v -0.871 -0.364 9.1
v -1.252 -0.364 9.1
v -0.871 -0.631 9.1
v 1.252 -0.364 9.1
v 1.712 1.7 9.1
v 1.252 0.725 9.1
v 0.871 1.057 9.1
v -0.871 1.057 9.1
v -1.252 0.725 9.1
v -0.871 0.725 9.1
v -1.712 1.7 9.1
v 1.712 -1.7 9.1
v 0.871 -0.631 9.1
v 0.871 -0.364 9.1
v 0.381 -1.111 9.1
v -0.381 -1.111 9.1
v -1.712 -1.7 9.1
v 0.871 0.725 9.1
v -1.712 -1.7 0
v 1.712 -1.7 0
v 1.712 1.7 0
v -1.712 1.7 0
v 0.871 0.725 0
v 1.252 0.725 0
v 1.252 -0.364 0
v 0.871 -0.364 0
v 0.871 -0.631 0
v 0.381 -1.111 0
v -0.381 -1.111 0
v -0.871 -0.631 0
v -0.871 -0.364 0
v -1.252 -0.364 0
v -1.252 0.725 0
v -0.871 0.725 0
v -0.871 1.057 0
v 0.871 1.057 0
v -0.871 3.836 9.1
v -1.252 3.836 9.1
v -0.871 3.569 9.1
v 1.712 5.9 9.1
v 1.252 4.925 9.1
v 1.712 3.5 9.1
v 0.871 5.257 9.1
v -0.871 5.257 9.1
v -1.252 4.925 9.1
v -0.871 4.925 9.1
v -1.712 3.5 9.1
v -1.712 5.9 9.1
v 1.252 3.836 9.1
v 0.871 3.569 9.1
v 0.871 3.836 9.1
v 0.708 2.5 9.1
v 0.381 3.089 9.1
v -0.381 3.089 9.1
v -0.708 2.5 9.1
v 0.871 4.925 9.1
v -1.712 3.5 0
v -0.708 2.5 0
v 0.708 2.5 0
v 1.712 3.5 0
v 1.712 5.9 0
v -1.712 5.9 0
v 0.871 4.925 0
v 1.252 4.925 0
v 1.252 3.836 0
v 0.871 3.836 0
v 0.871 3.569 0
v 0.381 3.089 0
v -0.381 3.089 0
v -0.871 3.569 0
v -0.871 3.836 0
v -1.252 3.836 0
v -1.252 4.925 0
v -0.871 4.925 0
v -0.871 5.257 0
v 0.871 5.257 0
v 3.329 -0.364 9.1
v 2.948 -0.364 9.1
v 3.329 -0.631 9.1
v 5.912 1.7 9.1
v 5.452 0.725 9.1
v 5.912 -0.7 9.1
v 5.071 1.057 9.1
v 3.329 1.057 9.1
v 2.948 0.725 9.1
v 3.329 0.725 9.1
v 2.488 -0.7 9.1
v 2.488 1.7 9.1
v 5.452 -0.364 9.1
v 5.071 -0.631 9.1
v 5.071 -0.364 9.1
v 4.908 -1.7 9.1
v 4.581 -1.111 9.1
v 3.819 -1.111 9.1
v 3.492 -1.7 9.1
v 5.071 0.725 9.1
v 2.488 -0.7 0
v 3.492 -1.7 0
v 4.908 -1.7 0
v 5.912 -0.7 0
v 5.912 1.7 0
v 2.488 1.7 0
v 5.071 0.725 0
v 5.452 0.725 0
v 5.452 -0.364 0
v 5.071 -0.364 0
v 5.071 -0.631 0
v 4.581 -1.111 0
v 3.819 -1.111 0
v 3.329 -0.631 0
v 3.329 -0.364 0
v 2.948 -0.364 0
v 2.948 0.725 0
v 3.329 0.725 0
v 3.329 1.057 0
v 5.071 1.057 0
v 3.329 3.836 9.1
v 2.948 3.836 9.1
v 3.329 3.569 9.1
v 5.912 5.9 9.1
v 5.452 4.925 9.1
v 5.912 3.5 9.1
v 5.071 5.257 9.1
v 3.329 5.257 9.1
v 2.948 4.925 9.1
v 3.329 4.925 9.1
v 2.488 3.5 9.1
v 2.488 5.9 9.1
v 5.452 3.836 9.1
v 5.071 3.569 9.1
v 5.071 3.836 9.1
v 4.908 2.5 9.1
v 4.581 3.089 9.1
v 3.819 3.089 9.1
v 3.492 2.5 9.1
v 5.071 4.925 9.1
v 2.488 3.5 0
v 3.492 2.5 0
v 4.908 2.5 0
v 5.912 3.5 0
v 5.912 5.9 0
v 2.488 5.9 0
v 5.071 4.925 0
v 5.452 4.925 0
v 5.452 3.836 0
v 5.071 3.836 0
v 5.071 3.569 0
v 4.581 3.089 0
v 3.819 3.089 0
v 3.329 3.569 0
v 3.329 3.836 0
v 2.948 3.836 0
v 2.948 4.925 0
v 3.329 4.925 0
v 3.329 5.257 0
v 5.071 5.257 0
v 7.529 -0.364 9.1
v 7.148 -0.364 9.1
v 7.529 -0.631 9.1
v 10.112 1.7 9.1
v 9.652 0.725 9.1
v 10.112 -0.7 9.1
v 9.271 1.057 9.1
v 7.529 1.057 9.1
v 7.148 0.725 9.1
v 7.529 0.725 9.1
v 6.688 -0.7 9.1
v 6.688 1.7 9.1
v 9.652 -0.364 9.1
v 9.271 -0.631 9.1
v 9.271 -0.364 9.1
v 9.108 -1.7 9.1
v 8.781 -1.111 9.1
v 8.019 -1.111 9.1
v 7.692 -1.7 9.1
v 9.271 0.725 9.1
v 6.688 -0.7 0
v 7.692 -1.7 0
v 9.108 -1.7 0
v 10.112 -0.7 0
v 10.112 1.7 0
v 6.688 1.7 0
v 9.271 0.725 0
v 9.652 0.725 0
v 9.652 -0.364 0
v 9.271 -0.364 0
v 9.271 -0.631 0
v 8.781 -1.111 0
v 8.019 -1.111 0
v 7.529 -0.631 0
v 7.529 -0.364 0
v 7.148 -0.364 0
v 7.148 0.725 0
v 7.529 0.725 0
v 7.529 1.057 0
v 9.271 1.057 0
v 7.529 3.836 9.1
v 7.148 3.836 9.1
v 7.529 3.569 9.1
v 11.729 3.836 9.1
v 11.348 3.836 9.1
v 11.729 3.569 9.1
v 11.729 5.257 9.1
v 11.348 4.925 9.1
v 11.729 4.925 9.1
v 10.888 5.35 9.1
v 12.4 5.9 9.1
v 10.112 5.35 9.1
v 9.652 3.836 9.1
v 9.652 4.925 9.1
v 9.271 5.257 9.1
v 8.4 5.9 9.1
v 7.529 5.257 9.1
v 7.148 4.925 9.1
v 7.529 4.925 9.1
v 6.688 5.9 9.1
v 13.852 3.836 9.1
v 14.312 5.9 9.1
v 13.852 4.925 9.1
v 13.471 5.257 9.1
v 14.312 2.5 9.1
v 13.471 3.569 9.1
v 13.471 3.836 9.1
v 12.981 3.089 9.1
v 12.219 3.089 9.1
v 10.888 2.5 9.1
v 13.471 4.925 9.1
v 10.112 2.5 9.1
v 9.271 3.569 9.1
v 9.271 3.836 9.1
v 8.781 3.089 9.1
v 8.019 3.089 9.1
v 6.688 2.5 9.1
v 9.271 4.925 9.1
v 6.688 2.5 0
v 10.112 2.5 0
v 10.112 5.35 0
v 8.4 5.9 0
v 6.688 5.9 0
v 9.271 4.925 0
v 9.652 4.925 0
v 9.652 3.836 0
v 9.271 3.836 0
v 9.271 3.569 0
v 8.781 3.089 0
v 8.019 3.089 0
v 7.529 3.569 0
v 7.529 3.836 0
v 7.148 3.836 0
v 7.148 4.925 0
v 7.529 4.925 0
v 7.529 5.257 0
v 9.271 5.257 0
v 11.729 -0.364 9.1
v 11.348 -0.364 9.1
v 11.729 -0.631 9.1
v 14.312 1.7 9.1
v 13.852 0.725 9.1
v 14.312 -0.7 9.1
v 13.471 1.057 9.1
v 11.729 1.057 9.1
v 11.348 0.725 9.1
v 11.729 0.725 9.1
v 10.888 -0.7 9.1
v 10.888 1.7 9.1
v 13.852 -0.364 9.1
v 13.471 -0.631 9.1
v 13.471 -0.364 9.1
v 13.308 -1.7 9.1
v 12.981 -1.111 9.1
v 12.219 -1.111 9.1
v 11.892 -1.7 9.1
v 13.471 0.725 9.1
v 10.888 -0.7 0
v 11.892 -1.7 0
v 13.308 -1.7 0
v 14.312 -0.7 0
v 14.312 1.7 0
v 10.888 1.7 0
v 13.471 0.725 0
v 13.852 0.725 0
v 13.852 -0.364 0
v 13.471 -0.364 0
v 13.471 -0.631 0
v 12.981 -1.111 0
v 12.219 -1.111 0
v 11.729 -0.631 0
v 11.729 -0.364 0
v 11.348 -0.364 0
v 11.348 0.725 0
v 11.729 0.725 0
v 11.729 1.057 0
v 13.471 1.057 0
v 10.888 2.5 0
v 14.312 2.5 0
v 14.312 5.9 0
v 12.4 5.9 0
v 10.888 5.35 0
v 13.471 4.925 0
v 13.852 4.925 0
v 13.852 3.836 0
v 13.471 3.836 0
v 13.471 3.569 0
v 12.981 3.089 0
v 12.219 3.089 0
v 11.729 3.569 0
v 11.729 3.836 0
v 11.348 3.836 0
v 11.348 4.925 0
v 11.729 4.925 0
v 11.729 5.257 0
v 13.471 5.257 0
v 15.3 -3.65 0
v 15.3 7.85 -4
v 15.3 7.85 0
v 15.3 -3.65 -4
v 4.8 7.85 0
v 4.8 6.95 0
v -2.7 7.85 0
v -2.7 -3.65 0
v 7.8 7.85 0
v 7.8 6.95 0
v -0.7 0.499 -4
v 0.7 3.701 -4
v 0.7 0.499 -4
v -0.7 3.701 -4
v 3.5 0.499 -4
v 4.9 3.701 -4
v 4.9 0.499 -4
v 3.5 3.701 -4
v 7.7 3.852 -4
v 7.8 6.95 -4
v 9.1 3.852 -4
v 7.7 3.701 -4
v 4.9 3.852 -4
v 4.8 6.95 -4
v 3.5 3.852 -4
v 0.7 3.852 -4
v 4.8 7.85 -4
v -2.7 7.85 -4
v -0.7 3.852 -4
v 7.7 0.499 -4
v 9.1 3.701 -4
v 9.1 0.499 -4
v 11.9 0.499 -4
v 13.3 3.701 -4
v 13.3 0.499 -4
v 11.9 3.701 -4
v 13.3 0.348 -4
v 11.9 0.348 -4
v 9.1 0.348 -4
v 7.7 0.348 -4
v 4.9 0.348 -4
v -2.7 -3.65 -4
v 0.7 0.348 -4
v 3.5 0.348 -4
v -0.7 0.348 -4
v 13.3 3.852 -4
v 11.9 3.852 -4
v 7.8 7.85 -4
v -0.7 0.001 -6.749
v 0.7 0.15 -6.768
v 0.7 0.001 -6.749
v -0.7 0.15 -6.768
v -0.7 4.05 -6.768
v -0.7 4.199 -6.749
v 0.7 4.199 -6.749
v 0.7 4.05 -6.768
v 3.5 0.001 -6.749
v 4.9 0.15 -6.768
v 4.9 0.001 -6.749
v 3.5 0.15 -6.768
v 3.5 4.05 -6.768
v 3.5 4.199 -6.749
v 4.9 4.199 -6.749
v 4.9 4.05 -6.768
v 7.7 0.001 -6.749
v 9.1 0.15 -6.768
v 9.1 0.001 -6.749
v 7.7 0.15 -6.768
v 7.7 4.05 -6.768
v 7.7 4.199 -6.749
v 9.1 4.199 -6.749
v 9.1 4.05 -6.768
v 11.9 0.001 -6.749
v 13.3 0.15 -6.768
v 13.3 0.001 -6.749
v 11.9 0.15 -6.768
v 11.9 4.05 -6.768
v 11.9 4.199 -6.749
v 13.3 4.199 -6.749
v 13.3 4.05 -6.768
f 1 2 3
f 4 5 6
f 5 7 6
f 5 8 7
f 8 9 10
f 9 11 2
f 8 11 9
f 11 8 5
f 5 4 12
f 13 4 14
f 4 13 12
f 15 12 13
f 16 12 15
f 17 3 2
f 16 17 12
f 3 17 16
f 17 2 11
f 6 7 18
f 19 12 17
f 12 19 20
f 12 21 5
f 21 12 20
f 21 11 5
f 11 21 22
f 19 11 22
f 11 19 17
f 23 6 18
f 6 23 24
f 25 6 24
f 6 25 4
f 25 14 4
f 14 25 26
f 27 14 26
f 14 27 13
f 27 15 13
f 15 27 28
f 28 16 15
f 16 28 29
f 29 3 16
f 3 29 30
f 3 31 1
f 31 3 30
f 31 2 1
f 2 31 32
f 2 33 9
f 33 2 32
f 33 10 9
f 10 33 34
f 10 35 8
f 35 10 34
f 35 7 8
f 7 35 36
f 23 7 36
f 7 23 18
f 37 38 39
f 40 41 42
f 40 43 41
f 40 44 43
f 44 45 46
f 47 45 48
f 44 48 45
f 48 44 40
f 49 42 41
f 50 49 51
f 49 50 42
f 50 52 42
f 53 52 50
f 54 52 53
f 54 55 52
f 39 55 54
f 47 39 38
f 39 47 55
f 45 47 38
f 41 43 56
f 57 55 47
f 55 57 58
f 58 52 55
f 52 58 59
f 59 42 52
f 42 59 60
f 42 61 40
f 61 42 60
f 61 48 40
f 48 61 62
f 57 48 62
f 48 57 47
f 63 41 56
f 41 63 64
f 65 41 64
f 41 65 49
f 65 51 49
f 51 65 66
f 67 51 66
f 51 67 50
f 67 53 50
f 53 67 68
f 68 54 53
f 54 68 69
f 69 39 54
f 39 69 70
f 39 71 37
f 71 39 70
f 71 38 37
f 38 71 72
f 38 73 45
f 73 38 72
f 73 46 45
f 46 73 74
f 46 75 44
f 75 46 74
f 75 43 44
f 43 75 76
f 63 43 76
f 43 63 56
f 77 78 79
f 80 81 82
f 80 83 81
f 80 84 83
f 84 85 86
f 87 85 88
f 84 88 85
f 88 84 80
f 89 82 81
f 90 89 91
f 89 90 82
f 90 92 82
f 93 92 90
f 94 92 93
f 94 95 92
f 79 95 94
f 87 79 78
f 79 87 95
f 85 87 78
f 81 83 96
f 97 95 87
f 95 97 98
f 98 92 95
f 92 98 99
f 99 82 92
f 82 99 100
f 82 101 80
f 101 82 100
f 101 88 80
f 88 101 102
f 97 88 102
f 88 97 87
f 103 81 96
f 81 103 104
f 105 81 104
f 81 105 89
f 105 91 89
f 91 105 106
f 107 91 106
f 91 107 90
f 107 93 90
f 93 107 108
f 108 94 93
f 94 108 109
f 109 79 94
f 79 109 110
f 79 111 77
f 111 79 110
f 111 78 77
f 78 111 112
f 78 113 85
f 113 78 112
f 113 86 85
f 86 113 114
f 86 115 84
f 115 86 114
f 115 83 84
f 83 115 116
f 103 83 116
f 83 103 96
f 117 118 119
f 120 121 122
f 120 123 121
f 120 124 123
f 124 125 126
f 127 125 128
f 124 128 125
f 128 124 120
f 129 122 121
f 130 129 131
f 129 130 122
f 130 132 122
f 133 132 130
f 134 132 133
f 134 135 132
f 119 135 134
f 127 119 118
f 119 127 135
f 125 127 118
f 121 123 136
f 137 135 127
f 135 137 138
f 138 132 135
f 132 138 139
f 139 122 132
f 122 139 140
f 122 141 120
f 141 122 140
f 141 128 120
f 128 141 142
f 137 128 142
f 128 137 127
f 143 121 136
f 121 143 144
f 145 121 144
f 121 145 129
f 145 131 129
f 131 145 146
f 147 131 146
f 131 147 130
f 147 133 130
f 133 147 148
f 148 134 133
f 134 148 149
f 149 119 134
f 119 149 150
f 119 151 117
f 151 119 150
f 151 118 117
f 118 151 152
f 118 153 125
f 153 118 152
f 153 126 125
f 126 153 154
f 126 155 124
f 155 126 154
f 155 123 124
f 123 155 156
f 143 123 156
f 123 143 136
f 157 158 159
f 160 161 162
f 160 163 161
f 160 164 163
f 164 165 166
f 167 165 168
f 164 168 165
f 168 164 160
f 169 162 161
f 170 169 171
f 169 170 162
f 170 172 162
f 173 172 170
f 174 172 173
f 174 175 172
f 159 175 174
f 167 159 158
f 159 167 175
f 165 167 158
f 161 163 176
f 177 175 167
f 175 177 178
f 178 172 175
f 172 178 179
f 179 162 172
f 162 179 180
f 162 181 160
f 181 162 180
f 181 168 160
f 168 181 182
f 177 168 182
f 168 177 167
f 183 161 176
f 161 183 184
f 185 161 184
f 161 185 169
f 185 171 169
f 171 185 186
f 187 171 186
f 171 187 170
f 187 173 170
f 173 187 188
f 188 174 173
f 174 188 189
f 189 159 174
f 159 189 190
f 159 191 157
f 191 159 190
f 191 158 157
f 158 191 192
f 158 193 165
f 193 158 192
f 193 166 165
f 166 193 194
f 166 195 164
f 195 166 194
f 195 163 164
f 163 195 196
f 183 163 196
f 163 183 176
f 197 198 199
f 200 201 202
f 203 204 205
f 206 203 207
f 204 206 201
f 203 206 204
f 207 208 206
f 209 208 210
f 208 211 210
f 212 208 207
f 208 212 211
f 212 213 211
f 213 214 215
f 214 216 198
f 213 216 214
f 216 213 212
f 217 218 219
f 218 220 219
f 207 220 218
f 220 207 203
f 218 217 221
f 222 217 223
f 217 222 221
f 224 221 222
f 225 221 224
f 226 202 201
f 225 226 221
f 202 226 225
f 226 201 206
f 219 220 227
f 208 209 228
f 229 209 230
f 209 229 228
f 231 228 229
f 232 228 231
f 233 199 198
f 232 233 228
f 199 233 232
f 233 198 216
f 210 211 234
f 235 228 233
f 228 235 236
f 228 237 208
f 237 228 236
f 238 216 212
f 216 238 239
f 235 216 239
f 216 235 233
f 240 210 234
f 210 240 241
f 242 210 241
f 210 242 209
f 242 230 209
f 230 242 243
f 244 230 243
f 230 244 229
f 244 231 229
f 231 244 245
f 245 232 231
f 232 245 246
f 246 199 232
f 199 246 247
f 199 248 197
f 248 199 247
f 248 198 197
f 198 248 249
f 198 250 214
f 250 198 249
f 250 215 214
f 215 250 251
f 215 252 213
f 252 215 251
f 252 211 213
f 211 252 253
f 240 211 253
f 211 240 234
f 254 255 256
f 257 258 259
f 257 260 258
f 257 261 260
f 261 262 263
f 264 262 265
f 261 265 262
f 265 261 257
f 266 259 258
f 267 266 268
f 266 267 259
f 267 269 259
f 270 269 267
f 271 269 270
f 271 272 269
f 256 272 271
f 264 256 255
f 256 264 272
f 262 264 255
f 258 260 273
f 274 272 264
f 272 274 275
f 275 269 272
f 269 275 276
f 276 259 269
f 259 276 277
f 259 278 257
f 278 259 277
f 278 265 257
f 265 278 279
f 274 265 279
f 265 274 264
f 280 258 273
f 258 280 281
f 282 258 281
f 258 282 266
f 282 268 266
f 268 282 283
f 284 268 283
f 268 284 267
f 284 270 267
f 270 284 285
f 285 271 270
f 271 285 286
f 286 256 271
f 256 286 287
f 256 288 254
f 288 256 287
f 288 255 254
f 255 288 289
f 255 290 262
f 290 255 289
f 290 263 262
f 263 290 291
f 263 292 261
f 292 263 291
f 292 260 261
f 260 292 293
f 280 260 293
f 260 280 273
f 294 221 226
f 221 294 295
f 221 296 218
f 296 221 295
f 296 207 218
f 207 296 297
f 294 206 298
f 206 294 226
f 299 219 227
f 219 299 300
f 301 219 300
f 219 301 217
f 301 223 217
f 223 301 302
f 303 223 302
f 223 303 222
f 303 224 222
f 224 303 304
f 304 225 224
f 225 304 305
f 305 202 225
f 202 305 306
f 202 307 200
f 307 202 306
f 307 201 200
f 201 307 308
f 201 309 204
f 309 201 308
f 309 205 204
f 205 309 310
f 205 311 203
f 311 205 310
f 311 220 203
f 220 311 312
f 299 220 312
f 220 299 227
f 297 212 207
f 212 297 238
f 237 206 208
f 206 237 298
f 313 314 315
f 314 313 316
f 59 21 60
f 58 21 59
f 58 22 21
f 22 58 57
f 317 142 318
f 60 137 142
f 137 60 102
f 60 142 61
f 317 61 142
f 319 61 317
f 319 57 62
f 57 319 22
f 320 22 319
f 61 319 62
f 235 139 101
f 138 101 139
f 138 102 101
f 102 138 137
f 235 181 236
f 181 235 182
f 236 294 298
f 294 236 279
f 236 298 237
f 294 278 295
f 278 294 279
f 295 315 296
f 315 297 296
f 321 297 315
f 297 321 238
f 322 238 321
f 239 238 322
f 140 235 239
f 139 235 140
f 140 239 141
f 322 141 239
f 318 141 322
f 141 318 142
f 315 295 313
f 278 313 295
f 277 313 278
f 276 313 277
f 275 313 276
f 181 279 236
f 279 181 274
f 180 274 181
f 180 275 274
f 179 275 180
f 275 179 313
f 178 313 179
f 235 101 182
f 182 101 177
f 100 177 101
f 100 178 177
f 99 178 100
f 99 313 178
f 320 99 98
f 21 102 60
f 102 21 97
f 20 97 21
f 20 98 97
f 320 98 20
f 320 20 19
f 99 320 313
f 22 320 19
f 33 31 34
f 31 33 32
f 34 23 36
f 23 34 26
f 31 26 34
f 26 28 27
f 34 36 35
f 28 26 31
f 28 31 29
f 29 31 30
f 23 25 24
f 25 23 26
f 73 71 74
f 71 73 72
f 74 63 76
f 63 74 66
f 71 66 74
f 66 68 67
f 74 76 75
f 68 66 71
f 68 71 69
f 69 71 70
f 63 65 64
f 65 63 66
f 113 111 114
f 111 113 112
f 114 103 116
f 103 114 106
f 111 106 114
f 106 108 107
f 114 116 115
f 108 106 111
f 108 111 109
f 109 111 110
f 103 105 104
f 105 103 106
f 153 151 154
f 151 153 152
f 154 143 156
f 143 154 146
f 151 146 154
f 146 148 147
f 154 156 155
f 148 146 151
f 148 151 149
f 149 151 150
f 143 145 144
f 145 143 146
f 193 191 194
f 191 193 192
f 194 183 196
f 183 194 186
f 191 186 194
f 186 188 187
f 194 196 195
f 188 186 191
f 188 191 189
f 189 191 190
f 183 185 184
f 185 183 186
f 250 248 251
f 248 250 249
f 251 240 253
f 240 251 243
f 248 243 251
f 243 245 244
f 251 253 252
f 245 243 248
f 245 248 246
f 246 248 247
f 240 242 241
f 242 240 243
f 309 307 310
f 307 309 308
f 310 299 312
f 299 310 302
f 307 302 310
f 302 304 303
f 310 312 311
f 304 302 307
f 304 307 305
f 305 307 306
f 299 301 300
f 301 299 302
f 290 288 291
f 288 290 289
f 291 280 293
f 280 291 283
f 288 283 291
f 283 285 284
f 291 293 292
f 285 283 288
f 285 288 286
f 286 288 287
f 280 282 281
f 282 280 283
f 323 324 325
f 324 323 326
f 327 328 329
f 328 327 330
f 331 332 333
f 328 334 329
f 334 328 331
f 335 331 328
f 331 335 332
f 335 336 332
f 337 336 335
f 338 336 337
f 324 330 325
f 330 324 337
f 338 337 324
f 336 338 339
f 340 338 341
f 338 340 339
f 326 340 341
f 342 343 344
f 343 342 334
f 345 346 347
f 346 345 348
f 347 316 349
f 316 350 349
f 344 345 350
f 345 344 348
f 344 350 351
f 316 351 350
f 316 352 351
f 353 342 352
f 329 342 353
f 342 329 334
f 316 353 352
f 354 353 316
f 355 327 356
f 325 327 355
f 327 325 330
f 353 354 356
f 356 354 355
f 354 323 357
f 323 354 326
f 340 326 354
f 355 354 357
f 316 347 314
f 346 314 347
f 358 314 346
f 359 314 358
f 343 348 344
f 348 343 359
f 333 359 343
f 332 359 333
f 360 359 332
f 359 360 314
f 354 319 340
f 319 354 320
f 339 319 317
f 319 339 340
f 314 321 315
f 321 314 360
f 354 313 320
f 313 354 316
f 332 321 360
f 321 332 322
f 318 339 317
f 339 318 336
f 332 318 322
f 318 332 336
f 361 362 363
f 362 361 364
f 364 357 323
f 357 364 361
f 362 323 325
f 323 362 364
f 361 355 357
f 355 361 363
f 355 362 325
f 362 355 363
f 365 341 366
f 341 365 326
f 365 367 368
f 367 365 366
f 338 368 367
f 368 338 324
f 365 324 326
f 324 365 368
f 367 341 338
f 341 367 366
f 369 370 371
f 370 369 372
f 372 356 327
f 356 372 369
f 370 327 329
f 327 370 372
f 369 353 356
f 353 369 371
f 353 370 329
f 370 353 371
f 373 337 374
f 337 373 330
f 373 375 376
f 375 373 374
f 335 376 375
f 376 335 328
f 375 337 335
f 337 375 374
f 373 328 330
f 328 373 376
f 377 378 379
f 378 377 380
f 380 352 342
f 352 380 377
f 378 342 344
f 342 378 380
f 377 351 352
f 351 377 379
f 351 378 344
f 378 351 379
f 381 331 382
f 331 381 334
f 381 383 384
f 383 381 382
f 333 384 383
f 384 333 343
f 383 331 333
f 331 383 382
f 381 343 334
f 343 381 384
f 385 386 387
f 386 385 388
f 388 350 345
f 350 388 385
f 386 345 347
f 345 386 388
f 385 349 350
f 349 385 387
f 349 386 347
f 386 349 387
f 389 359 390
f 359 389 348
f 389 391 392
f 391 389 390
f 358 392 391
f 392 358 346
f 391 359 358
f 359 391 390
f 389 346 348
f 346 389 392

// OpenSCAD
peg_width = 3.4;
peg_pitch = 4.2;
peg_height = 9.1 + 0.01;

module square_peg(x=0, y=0, z=peg_height) {
    module half_square() {
        translate([0, peg_width/2])
        scale([peg_width/687, peg_width/687])
        polygon([[0, 0], [346, 0], [346, -687], [0, -687], 
        [0, -568], [77, -568], [176, -471], [176, -417], [253, -417], [253, -197], [176, -197], [176, -130], [0, -130], [0, 0]]);
    }    
    
    translate([x*peg_pitch, y*peg_pitch, 0])
    linear_extrude(z)
    union() {
        half_square();
        mirror([-180, 0]) half_square();
    }
}

// dimensions pulled from a screenshot of Molex 444750411_sd.pdf
module hex_peg(x=0, y=0, z=peg_height) {
    module half_hex() {
        translate([0, peg_width/2])
        scale([peg_width/687, peg_width/687])
        polygon([[0, 0], [346, 0], [346, -485], [143, -687], [0, -687],
        [0, -568], [77, -568], [176, -471], [176, -417], [253, -417], [253, -197], [176, -197], [176, -130], [0, -130], [0, 0]]);
    }
    
    translate([x*peg_pitch, y*peg_pitch, 0])
    linear_extrude(z)
    union() {
        half_hex();
        mirror([-180, 0]) half_hex();
    }
}

module contact() {
    // 3.2 lower, 3.9 upper (measuring \/ spread)
    // 1.4 x 2.8 leads
    translate([-0.7, peg_pitch/2 - 3.2/2, 0])
    rotate([180 - asin(.35/2.8), 0, 0])
    cube([1.4, .15, 2.8]);
}   

//Actual pins
translate([0, 0, -0.01])
union() {
    square_peg(0,0);
    hex_peg(0, 1);
    hex_peg(1,0);
    hex_peg(1,1);
    hex_peg(2,0);
    square_peg(2,1);
    hex_peg(3,0);
    square_peg(3,1);

    // bridge piece
    translate([2*peg_pitch, peg_width/2 + peg_pitch - 0.55, 0])
    cube([4, .55, peg_height]);
}

// Base
translate([1.5*peg_pitch, peg_pitch/2, -4/2]) 
difference() {
    cube([18, 11.5, 4], center = true);
    translate([0, 1 + 11.5/2 - (11.5 - 10.6), 0])
    cube([3, 2, 5], center=true);
}

// Contacts
for (i = [0:3])
{
    translate([i*peg_pitch, 0, -3.99]) contact();
    translate([i*peg_pitch, peg_pitch, -3.99]) rotate([0, 0, 180]) contact();
}
